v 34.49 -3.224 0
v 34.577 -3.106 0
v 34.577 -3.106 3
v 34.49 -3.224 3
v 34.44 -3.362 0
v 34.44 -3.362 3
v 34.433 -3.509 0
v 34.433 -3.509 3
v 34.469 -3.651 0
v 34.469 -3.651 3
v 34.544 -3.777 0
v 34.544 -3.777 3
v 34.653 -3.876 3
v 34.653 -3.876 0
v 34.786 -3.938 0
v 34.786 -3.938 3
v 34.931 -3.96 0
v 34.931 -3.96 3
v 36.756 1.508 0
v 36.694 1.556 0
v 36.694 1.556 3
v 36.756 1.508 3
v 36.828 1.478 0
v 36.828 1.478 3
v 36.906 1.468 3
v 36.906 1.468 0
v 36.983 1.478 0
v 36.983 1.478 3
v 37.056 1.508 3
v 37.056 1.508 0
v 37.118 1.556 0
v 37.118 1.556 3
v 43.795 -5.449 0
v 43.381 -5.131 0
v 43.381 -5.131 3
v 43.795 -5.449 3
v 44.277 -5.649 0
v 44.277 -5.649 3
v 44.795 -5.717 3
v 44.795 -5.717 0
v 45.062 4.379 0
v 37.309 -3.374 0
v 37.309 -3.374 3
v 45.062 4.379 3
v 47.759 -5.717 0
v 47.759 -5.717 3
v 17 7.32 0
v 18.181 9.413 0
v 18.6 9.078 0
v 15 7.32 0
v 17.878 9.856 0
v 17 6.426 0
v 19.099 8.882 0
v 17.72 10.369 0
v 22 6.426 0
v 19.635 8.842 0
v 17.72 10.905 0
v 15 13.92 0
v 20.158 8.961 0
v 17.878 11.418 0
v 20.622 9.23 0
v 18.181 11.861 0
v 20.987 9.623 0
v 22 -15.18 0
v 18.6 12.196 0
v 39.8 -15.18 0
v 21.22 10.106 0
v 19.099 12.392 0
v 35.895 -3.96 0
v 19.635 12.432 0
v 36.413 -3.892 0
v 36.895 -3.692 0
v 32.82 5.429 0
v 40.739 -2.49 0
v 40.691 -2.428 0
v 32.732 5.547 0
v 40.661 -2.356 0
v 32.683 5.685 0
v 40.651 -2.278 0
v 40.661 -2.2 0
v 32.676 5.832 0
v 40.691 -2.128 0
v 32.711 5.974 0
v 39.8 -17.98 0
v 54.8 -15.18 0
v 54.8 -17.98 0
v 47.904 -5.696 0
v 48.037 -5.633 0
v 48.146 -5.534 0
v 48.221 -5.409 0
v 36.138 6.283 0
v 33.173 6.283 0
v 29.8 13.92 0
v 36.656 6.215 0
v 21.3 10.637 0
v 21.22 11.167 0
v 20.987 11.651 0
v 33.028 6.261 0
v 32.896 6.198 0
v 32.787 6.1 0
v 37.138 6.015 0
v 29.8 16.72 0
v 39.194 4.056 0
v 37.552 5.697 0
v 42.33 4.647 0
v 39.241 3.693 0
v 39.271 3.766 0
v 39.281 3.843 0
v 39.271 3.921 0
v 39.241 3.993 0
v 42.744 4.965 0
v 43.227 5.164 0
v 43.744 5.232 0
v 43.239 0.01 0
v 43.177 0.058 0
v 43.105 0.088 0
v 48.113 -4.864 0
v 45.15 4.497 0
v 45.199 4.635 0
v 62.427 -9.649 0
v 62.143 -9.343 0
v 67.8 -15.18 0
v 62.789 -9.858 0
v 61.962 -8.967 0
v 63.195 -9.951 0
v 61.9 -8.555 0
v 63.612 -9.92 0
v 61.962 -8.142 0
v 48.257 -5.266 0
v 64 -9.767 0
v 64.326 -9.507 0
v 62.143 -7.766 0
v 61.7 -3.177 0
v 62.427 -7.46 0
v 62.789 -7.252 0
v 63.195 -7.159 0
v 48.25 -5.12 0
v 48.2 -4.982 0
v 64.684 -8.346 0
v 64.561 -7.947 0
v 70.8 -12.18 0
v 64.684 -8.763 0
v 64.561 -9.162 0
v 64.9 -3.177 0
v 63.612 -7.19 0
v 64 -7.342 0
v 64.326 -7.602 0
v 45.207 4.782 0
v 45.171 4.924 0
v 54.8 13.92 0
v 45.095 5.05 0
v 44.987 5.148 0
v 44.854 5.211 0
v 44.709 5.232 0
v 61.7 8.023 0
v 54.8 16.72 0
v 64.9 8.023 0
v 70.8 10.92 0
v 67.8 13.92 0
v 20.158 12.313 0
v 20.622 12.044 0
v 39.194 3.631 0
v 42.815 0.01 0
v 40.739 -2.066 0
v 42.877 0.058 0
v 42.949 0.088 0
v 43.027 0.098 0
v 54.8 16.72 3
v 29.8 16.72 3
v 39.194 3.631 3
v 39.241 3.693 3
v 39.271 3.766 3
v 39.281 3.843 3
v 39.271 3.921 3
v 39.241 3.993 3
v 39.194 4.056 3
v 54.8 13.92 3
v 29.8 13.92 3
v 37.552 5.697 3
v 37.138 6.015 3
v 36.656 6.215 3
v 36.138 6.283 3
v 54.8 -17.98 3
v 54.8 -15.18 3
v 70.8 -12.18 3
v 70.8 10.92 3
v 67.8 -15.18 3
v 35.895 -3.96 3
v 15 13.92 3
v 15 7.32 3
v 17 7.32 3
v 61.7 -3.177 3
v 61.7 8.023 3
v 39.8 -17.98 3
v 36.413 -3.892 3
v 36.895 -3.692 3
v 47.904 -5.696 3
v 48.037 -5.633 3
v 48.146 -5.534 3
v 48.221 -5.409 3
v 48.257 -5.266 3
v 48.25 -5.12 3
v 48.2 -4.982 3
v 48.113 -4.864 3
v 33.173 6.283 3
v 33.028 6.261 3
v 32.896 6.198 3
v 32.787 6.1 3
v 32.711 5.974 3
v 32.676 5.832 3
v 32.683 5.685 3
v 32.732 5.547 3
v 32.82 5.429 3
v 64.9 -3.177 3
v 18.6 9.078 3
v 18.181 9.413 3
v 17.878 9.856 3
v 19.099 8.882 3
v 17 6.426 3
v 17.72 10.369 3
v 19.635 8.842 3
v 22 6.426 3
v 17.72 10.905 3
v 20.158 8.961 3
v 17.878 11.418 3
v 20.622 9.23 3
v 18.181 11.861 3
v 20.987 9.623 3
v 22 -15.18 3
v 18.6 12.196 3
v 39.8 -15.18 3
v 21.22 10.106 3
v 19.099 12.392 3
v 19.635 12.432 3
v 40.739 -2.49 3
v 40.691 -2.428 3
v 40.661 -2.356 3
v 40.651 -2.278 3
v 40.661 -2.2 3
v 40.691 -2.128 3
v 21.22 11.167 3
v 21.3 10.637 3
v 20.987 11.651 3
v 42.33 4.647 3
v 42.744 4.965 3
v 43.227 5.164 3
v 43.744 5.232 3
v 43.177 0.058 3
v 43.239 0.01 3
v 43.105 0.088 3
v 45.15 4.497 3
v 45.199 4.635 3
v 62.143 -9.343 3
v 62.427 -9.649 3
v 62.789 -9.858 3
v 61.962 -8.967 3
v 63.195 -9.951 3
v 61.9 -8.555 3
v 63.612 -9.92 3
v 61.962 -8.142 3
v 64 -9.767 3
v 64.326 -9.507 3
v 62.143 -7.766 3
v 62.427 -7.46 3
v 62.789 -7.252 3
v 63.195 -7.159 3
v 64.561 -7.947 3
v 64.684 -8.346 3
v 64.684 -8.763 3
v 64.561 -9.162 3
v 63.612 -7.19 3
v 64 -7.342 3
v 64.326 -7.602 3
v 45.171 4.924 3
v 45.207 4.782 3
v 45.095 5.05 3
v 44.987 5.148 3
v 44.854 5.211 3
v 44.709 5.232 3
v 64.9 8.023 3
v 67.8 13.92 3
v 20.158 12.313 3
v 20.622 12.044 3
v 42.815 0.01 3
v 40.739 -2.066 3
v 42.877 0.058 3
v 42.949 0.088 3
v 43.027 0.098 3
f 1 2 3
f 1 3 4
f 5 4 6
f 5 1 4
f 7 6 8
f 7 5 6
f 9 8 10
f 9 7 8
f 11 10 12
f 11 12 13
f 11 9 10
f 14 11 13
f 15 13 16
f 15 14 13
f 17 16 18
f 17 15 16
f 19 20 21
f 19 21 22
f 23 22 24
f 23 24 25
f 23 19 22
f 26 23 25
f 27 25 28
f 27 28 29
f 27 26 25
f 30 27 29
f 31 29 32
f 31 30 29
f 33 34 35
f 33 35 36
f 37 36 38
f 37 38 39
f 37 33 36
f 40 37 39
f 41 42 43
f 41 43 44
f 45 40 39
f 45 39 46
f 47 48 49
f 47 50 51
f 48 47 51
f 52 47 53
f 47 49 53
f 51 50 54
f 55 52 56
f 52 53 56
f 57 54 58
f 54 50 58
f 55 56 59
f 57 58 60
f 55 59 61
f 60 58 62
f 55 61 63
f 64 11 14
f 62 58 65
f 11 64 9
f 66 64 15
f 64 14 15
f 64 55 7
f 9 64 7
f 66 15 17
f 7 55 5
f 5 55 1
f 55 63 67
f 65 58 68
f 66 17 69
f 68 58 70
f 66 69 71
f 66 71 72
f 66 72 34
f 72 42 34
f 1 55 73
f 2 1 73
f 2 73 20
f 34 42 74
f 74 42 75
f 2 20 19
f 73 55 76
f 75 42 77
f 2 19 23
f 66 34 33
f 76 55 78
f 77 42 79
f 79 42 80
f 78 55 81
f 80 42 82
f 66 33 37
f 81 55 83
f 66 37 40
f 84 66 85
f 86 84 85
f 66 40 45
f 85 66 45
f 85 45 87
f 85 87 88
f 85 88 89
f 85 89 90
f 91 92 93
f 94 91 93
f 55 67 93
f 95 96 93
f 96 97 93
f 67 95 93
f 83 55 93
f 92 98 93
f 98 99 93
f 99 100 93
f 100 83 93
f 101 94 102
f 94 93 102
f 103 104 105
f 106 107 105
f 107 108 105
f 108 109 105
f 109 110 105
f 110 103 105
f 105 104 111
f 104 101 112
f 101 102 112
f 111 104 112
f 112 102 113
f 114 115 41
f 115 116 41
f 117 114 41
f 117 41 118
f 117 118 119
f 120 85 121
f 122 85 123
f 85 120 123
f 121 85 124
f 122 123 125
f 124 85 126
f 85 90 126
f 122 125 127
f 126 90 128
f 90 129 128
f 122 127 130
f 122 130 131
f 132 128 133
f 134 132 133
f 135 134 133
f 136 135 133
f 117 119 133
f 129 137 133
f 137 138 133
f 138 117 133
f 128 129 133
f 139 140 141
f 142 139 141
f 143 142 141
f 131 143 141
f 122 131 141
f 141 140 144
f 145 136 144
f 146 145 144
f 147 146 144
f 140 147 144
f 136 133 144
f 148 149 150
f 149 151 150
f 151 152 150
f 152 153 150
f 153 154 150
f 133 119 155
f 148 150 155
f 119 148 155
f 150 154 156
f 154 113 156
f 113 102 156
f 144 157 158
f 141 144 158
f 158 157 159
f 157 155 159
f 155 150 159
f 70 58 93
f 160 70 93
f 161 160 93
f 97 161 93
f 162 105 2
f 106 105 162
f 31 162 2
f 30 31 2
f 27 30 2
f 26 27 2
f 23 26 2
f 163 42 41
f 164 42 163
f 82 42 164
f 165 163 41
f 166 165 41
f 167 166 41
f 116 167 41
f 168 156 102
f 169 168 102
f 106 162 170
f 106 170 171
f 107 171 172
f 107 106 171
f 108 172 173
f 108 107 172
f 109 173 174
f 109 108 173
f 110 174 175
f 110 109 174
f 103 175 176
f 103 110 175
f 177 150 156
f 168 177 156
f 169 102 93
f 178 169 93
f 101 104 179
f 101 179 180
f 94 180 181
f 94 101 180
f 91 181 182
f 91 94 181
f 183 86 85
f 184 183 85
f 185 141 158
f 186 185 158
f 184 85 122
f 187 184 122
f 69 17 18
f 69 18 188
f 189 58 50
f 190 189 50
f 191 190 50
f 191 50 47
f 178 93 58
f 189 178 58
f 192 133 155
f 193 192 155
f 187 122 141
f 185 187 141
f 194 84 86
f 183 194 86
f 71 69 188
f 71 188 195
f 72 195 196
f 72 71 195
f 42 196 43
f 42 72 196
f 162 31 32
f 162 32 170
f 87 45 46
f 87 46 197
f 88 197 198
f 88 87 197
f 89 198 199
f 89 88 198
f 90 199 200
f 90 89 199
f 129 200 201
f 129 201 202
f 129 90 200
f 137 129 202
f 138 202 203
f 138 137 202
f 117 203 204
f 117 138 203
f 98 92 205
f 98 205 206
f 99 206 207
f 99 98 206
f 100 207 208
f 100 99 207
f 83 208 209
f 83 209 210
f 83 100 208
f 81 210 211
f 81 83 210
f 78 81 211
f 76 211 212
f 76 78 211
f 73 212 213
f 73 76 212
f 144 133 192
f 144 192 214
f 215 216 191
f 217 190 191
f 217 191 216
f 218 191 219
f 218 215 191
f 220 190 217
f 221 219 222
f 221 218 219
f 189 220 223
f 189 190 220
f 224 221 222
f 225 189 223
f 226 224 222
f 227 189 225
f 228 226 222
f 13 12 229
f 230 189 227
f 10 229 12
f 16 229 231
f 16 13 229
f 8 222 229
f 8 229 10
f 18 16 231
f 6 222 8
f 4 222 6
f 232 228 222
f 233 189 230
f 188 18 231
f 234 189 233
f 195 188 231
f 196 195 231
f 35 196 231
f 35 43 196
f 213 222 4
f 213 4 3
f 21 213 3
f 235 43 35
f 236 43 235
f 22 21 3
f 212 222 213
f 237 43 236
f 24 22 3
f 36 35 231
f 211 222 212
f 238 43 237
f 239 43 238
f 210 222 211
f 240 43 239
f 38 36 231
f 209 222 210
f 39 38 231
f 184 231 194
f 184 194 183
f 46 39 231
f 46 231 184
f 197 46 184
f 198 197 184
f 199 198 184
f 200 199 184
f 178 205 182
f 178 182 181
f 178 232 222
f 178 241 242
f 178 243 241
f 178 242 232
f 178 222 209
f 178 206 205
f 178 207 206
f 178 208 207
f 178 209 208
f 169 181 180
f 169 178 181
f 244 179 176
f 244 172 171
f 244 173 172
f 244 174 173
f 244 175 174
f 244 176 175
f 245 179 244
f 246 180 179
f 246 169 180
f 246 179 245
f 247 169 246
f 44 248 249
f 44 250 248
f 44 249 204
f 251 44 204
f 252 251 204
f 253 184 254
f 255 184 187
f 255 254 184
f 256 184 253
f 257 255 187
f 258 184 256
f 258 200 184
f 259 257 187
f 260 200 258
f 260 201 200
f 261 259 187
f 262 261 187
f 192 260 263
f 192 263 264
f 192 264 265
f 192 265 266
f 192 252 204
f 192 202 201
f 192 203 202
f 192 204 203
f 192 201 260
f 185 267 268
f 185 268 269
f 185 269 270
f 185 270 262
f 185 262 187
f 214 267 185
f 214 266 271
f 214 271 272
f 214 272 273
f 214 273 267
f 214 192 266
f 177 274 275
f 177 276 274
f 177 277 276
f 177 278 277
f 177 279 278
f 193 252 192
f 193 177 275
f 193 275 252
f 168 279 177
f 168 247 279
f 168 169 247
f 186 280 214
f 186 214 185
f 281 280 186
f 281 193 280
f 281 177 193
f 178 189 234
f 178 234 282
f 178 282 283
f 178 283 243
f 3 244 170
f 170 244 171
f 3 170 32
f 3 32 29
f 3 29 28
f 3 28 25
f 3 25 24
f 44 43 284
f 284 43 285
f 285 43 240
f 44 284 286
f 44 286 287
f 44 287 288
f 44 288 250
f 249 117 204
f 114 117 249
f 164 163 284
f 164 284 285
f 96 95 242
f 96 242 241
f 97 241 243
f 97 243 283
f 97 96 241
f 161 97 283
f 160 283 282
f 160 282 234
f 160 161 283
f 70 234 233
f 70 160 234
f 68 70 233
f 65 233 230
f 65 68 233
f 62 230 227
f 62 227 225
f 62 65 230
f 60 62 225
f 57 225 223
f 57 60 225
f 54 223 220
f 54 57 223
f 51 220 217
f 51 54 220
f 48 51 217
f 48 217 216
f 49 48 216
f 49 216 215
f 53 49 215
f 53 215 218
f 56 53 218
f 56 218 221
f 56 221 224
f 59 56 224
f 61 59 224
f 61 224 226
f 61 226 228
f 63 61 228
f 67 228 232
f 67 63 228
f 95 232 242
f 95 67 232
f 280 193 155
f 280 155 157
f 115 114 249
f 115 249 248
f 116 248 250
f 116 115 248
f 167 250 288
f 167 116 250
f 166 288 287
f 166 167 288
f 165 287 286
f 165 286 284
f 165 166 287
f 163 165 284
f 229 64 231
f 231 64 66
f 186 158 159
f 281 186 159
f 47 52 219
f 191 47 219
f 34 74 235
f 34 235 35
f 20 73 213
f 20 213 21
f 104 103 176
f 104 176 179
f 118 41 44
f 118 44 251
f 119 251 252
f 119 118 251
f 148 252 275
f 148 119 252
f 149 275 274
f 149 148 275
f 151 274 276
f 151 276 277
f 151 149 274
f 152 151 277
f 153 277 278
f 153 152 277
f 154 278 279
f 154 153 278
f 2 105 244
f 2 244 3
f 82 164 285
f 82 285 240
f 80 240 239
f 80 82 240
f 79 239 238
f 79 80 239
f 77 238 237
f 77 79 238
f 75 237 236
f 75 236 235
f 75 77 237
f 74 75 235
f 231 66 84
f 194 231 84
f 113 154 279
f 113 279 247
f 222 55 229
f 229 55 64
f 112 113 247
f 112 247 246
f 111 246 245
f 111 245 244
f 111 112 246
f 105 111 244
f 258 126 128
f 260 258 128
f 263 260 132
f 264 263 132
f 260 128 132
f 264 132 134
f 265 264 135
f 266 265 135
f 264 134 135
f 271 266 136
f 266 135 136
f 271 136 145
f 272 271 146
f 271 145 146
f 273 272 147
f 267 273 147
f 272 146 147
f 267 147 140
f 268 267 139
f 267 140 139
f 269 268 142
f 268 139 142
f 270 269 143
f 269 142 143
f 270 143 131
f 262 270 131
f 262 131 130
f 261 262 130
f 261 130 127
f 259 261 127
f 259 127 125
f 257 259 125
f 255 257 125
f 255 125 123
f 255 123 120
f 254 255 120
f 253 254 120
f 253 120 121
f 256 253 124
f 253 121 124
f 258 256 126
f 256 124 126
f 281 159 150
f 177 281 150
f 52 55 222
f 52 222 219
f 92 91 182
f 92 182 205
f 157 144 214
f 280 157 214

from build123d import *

# Parameters (mm, degrees)
SKETCH_1_R           = 1.8
SKETCH_1_W           = 3
SKETCH_1_H           = 12
EXTRUDE_1_DEPTH      = 3
SKETCH_3_W           = 34
SKETCH_3_H           = 3
CUT_EXTRUDE_1_DEPTH  = 10
SKETCH_4_W           = 38
SKETCH_4_H           = 2
CUT_EXTRUDE_2_DEPTH  = 10
SKETCH_5_W           = 3
SKETCH_5_H           = 2
EXTRUDE_2_DEPTH      = 2
SKETCH_6_W           = 3
SKETCH_6_H           = 2
EXTRUDE_3_DEPTH      = 2
SKETCH_7_W           = 34
SKETCH_7_H           = 3
CUT_EXTRUDE_3_DEPTH  = 2
SKETCH_8_W           = 3
SKETCH_8_H           = 10
EXTRUDE_4_DEPTH      = 5
SKETCH_9_W           = 5
SKETCH_9_H           = 3
CUT_EXTRUDE_4_DEPTH  = 2
CUT_EXTRUDE_5_DEPTH  = 10
SKETCH_11_W          = 3
SKETCH_11_H          = 8
CUT_EXTRUDE_6_DEPTH  = 5
SKETCH_12_W          = 3.2
SKETCH_12_H          = 12.2
SKETCH_12_W_2        = 3
SKETCH_12_H_2        = 12
CUT_EXTRUDE_7_DEPTH  = 10
SKETCH_13_W          = 3.2
SKETCH_13_H          = 3
EXTRUDE_5_DEPTH      = 3
SKETCH_14_W          = 3.2
SKETCH_14_H          = 3
CUT_EXTRUDE_8_DEPTH  = 3
SKETCH_15_W          = 3.2
SKETCH_15_H          = 3
EXTRUDE_6_DEPTH      = 1
SKETCH_16_R          = 1.4
CUT_EXTRUDE_9_DEPTH  = 3
SKETCH_17_W          = 5
SKETCH_17_H          = 3.106186253
CUT_EXTRUDE_10_DEPTH = 10


with BuildPart() as part:
    # 草图1 → 凸台-拉伸1 (new body)
    with BuildSketch(Plane.XY):
        Polygon((-64.8, 13.92), (-67.8, 13.92), (-70.8, 10.92), (-70.8, -12.18), (-67.8, -15.18), (-64.8, -15.18), (-54.8, -15.18), (-54.8, -17.98), (-39.8, -17.98), (-39.8, -15.18), (-22, -15.18), (-22, 3.32), (-17, 3.32), (-17, 0.32), (17, 0.32), (17, 3.32), (22, 3.32), (22, -15.18), (39.8, -15.18), (39.8, -17.98), (54.8, -17.98), (54.8, -15.18), (67.8, -15.18), (70.8, -12.18), (70.8, 10.92), (67.8, 13.92), (54.8, 13.92), (54.8, 16.72), (29.8, 16.72), (29.8, 13.92), (10, 13.92), (10, 16.72), (-10, 16.72), (-10, 13.92), (-29.8, 13.92), (-29.8, 16.72), (-54.8, 16.72), (-54.8, 13.92), align=None)
        with Locations((-19.5, 10.636938849)):
            Circle(SKETCH_1_R, mode=Mode.SUBTRACT)
        with Locations((19.5, 10.636938849)):
            Circle(SKETCH_1_R, mode=Mode.SUBTRACT)
        with BuildLine():
            Line((-48.112743691, -4.863700543), (-43.239089288, 0.009953861))
            ThreePointArc((-43.239089288, 0.009953861), (-43.026957254, 0.097821826), (-42.814825219, 0.009953861))
            Line((-42.814825219, 0.009953861), (-40.739089288, -2.065782071))
            ThreePointArc((-40.739089288, -2.065782071), (-40.651221322, -2.277914105), (-40.739089288, -2.490046139))
            Line((-40.739089288, -2.490046139), (-43.380510644, -5.131467496))
            ThreePointArc((-43.380510644, -5.131467496), (-44.029357342, -5.565012998), (-44.794724207, -5.717253933))
            Line((-44.794724207, -5.717253933), (-47.759190301, -5.717253933))
            ThreePointArc((-47.759190301, -5.717253933), (-48.221130067, -5.408595649), (-48.112743691, -4.863700543))
        make_face(mode=Mode.SUBTRACT)
        with Locations((-63.3, -0.08)):
            Rectangle(SKETCH_1_W, SKETCH_1_H, mode=Mode.SUBTRACT)
        with BuildLine():
            Line((-37.309442832, -3.374108183), (-45.06249116, 4.378940145))
            ThreePointArc((-45.06249116, 4.378940145), (-45.170877535, 4.923835251), (-44.708937769, 5.232493535))
            Line((-44.708937769, 5.232493535), (-43.744471675, 5.232493535))
            ThreePointArc((-43.744471675, 5.232493535), (-42.97910481, 5.0802526), (-42.330258113, 4.646707097))
            Line((-42.330258113, 4.646707097), (-34.577209785, -3.10634123))
            ThreePointArc((-34.577209785, -3.10634123), (-34.46882341, -3.651236336), (-34.930763176, -3.95989462))
            Line((-34.930763176, -3.95989462), (-35.89522927, -3.95989462))
            ThreePointArc((-35.89522927, -3.95989462), (-36.660596135, -3.807653685), (-37.309442832, -3.374108183))
        make_face(mode=Mode.SUBTRACT)
        with BuildLine():
            Line((-32.819850472, 5.429192676), (-36.693504876, 1.555538273))
            ThreePointArc((-36.693504876, 1.555538273), (-36.90563691, 1.467670307), (-37.117768944, 1.555538273))
            Line((-37.117768944, 1.555538273), (-39.193504876, 3.631274204))
            ThreePointArc((-39.193504876, 3.631274204), (-39.281372841, 3.843406239), (-39.193504876, 4.055538273))
            Line((-39.193504876, 4.055538273), (-37.55208352, 5.696959629))
            ThreePointArc((-37.55208352, 5.696959629), (-36.903236822, 6.130505132), (-36.137869957, 6.282746067))
            Line((-36.137869957, 6.282746067), (-33.173403863, 6.282746067))
            ThreePointArc((-33.173403863, 6.282746067), (-32.711464097, 5.974087783), (-32.819850472, 5.429192676))
        make_face(mode=Mode.SUBTRACT)
        with Locations((63.3, -0.076886306)):
            Rectangle(SKETCH_1_W, SKETCH_1_H, mode=Mode.SUBTRACT)
        with BuildLine():
            Line((42.330258113, 4.646707097), (34.577209785, -3.10634123))
            ThreePointArc((34.577209785, -3.10634123), (34.46882341, -3.651236336), (34.930763176, -3.95989462))
            Line((34.930763176, -3.95989462), (35.89522927, -3.95989462))
            ThreePointArc((35.89522927, -3.95989462), (36.660596135, -3.807653685), (37.309442832, -3.374108183))
            Line((37.309442832, -3.374108183), (45.06249116, 4.378940145))
            ThreePointArc((45.06249116, 4.378940145), (45.170877535, 4.923835251), (44.708937769, 5.232493535))
            Line((44.708937769, 5.232493535), (43.744471675, 5.232493535))
            ThreePointArc((43.744471675, 5.232493535), (42.97910481, 5.0802526), (42.330258113, 4.646707097))
        make_face(mode=Mode.SUBTRACT)
        with BuildLine():
            Line((48.112743691, -4.863700543), (43.239089288, 0.009953861))
            ThreePointArc((43.239089288, 0.009953861), (43.026957254, 0.097821826), (42.814825219, 0.009953861))
            Line((42.814825219, 0.009953861), (40.739089288, -2.065782071))
            ThreePointArc((40.739089288, -2.065782071), (40.651221322, -2.277914105), (40.739089288, -2.490046139))
            Line((40.739089288, -2.490046139), (43.380510644, -5.131467496))
            ThreePointArc((43.380510644, -5.131467496), (44.029357342, -5.565012998), (44.794724207, -5.717253933))
            Line((44.794724207, -5.717253933), (47.759190301, -5.717253933))
            ThreePointArc((47.759190301, -5.717253933), (48.221130067, -5.408595649), (48.112743691, -4.863700543))
        make_face(mode=Mode.SUBTRACT)
        with BuildLine():
            Line((39.193504876, 4.055538273), (37.55208352, 5.696959629))
            ThreePointArc((37.55208352, 5.696959629), (36.903236822, 6.130505132), (36.137869957, 6.282746067))
            Line((36.137869957, 6.282746067), (33.173403863, 6.282746067))
            ThreePointArc((33.173403863, 6.282746067), (32.711464097, 5.974087783), (32.819850472, 5.429192676))
            Line((32.819850472, 5.429192676), (36.693504876, 1.555538273))
            ThreePointArc((36.693504876, 1.555538273), (36.90563691, 1.467670307), (37.117768944, 1.555538273))
            Line((37.117768944, 1.555538273), (39.193504876, 3.631274204))
            ThreePointArc((39.193504876, 3.631274204), (39.281372841, 3.843406239), (39.193504876, 4.055538273))
        make_face(mode=Mode.SUBTRACT)
    extrude(amount=EXTRUDE_1_DEPTH)

    # 草图3 → 切除-拉伸1 (cut)
    with BuildSketch(Plane(origin=(0, 0, 0), x_dir=(-1, 0, 0), z_dir=(0, 0, -1))):
        with Locations((0, 1.82)):
            Rectangle(SKETCH_3_W, SKETCH_3_H)
    extrude(amount=-CUT_EXTRUDE_1_DEPTH, mode=Mode.SUBTRACT)

    # 草图4 → 切除-拉伸2 (cut)
    with BuildSketch(Plane(origin=(0, 0, 0), x_dir=(-1, 0, 0), z_dir=(0, 0, -1))):
        with Locations((0, 4.32)):
            Rectangle(SKETCH_4_W, SKETCH_4_H)
    extrude(amount=-CUT_EXTRUDE_2_DEPTH, mode=Mode.SUBTRACT)

    # 草图5 → 凸台-拉伸2 (add)
    with BuildSketch(Plane(origin=(-19, 0, 0), x_dir=(0, 0, -1), z_dir=(1, 0, 0))):
        with Locations((-1.5, 4.32)):
            Rectangle(SKETCH_5_W, SKETCH_5_H)
    extrude(amount=EXTRUDE_2_DEPTH)

    # 草图6 → 凸台-拉伸3 (add)
    with BuildSketch(Plane.ZY.offset(-19)):
        with Locations((1.5, 4.32)):
            Rectangle(SKETCH_6_W, SKETCH_6_H)
    extrude(amount=EXTRUDE_3_DEPTH)

    # 草图7 → 切除-拉伸3 (cut)
    with BuildSketch(Plane.XZ.offset(-5.32)):
        with Locations((0, 1.5)):
            Rectangle(SKETCH_7_W, SKETCH_7_H)
    extrude(amount=-CUT_EXTRUDE_3_DEPTH, mode=Mode.SUBTRACT)

    # 草图8 → 凸台-拉伸4 (add)
    with BuildSketch(Plane.ZY.offset(-22)):
        with Locations((1.5, -7.18)):
            Rectangle(SKETCH_8_W, SKETCH_8_H)
    extrude_4 = extrude(amount=EXTRUDE_4_DEPTH)

    # 镜向1: 凸台-拉伸4 across plane
    add(extrude_4.mirror(Plane.ZY))

    # 草图9 → 切除-拉伸4 (cut)
    with BuildSketch(Plane.XZ.offset(12.18)):
        with Locations((-19.5, 1.5)):
            Rectangle(SKETCH_9_W, SKETCH_9_H)
        with Locations((19.5, 1.5)):
            Rectangle(SKETCH_9_W, SKETCH_9_H)
    extrude(amount=-CUT_EXTRUDE_4_DEPTH, mode=Mode.SUBTRACT)

    # 草图10 → 切除-拉伸5 (cut)
    with BuildSketch(Plane(origin=(0, 0, 0), x_dir=(-1, 0, 0), z_dir=(0, 0, -1))):
        Polygon((-15, 7.32), (-15, 18.727392341), (81.723481171, 18.727392341), (81.723481171, -24.797051458), (-15, -24.797051458), align=None)
    extrude(amount=-CUT_EXTRUDE_5_DEPTH, mode=Mode.SUBTRACT)

    # 草图11 → 切除-拉伸6 (cut)
    with BuildSketch(Plane.ZY.offset(-17)):
        with Locations((1.5, -6.18)):
            Rectangle(SKETCH_11_W, SKETCH_11_H)
    extrude(amount=-CUT_EXTRUDE_6_DEPTH, mode=Mode.SUBTRACT)

    # 草图12 → 切除-拉伸7 (cut)
    with BuildSketch(Plane(origin=(0, 0, 0), x_dir=(-1, 0, 0), z_dir=(0, 0, -1))):
        with Locations((-63.3, -0.076886306)):
            Rectangle(SKETCH_12_W, SKETCH_12_H)
        with Locations((-63.3, -0.076886306)):
            Rectangle(SKETCH_12_W_2, SKETCH_12_H_2, mode=Mode.SUBTRACT)
    extrude(amount=-CUT_EXTRUDE_7_DEPTH, mode=Mode.SUBTRACT)

    # 草图13 → 凸台-拉伸5 (add)
    with BuildSketch(Plane(origin=(0, -6.176886306, 0), x_dir=(1, 0, 0), z_dir=(0, 1, 0))):
        with Locations((63.3, -1.5)):
            Rectangle(SKETCH_13_W, SKETCH_13_H)
    extrude(amount=EXTRUDE_5_DEPTH)

    # 草图14 → 切除-拉伸8 (cut)
    with BuildSketch(Plane.XZ.offset(-6.023113694)):
        with Locations((63.3, 1.5)):
            Rectangle(SKETCH_14_W, SKETCH_14_H)
    extrude(amount=-CUT_EXTRUDE_8_DEPTH, mode=Mode.SUBTRACT)

    # 草图15 → 凸台-拉伸6 (add)
    with BuildSketch(Plane.XZ.offset(-9.023113694)):
        with Locations((63.3, 1.5)):
            Rectangle(SKETCH_15_W, SKETCH_15_H)
    extrude(amount=EXTRUDE_6_DEPTH)

    # 草图16 → 切除-拉伸9 (cut)
    with BuildSketch(Plane(origin=(-133.943153128, 43.327317851, 0), x_dir=(-1, 0, 0), z_dir=(0, 0, -1))):
        with Locations((-197.243153128, -51.882049417)):
            Circle(SKETCH_16_R)
    extrude(amount=-CUT_EXTRUDE_9_DEPTH, mode=Mode.SUBTRACT)

    # 草图17 → 切除-拉伸10 (cut)
    with BuildSketch(Plane(origin=(-133.943153128, 43.327317851, 0), x_dir=(-1, 0, 0), z_dir=(0, 0, -1))):
        with Locations((-153.443153128, -38.454224725)):
            Rectangle(SKETCH_17_W, SKETCH_17_H)
    extrude(amount=-CUT_EXTRUDE_10_DEPTH, mode=Mode.SUBTRACT)


solid = part.part
